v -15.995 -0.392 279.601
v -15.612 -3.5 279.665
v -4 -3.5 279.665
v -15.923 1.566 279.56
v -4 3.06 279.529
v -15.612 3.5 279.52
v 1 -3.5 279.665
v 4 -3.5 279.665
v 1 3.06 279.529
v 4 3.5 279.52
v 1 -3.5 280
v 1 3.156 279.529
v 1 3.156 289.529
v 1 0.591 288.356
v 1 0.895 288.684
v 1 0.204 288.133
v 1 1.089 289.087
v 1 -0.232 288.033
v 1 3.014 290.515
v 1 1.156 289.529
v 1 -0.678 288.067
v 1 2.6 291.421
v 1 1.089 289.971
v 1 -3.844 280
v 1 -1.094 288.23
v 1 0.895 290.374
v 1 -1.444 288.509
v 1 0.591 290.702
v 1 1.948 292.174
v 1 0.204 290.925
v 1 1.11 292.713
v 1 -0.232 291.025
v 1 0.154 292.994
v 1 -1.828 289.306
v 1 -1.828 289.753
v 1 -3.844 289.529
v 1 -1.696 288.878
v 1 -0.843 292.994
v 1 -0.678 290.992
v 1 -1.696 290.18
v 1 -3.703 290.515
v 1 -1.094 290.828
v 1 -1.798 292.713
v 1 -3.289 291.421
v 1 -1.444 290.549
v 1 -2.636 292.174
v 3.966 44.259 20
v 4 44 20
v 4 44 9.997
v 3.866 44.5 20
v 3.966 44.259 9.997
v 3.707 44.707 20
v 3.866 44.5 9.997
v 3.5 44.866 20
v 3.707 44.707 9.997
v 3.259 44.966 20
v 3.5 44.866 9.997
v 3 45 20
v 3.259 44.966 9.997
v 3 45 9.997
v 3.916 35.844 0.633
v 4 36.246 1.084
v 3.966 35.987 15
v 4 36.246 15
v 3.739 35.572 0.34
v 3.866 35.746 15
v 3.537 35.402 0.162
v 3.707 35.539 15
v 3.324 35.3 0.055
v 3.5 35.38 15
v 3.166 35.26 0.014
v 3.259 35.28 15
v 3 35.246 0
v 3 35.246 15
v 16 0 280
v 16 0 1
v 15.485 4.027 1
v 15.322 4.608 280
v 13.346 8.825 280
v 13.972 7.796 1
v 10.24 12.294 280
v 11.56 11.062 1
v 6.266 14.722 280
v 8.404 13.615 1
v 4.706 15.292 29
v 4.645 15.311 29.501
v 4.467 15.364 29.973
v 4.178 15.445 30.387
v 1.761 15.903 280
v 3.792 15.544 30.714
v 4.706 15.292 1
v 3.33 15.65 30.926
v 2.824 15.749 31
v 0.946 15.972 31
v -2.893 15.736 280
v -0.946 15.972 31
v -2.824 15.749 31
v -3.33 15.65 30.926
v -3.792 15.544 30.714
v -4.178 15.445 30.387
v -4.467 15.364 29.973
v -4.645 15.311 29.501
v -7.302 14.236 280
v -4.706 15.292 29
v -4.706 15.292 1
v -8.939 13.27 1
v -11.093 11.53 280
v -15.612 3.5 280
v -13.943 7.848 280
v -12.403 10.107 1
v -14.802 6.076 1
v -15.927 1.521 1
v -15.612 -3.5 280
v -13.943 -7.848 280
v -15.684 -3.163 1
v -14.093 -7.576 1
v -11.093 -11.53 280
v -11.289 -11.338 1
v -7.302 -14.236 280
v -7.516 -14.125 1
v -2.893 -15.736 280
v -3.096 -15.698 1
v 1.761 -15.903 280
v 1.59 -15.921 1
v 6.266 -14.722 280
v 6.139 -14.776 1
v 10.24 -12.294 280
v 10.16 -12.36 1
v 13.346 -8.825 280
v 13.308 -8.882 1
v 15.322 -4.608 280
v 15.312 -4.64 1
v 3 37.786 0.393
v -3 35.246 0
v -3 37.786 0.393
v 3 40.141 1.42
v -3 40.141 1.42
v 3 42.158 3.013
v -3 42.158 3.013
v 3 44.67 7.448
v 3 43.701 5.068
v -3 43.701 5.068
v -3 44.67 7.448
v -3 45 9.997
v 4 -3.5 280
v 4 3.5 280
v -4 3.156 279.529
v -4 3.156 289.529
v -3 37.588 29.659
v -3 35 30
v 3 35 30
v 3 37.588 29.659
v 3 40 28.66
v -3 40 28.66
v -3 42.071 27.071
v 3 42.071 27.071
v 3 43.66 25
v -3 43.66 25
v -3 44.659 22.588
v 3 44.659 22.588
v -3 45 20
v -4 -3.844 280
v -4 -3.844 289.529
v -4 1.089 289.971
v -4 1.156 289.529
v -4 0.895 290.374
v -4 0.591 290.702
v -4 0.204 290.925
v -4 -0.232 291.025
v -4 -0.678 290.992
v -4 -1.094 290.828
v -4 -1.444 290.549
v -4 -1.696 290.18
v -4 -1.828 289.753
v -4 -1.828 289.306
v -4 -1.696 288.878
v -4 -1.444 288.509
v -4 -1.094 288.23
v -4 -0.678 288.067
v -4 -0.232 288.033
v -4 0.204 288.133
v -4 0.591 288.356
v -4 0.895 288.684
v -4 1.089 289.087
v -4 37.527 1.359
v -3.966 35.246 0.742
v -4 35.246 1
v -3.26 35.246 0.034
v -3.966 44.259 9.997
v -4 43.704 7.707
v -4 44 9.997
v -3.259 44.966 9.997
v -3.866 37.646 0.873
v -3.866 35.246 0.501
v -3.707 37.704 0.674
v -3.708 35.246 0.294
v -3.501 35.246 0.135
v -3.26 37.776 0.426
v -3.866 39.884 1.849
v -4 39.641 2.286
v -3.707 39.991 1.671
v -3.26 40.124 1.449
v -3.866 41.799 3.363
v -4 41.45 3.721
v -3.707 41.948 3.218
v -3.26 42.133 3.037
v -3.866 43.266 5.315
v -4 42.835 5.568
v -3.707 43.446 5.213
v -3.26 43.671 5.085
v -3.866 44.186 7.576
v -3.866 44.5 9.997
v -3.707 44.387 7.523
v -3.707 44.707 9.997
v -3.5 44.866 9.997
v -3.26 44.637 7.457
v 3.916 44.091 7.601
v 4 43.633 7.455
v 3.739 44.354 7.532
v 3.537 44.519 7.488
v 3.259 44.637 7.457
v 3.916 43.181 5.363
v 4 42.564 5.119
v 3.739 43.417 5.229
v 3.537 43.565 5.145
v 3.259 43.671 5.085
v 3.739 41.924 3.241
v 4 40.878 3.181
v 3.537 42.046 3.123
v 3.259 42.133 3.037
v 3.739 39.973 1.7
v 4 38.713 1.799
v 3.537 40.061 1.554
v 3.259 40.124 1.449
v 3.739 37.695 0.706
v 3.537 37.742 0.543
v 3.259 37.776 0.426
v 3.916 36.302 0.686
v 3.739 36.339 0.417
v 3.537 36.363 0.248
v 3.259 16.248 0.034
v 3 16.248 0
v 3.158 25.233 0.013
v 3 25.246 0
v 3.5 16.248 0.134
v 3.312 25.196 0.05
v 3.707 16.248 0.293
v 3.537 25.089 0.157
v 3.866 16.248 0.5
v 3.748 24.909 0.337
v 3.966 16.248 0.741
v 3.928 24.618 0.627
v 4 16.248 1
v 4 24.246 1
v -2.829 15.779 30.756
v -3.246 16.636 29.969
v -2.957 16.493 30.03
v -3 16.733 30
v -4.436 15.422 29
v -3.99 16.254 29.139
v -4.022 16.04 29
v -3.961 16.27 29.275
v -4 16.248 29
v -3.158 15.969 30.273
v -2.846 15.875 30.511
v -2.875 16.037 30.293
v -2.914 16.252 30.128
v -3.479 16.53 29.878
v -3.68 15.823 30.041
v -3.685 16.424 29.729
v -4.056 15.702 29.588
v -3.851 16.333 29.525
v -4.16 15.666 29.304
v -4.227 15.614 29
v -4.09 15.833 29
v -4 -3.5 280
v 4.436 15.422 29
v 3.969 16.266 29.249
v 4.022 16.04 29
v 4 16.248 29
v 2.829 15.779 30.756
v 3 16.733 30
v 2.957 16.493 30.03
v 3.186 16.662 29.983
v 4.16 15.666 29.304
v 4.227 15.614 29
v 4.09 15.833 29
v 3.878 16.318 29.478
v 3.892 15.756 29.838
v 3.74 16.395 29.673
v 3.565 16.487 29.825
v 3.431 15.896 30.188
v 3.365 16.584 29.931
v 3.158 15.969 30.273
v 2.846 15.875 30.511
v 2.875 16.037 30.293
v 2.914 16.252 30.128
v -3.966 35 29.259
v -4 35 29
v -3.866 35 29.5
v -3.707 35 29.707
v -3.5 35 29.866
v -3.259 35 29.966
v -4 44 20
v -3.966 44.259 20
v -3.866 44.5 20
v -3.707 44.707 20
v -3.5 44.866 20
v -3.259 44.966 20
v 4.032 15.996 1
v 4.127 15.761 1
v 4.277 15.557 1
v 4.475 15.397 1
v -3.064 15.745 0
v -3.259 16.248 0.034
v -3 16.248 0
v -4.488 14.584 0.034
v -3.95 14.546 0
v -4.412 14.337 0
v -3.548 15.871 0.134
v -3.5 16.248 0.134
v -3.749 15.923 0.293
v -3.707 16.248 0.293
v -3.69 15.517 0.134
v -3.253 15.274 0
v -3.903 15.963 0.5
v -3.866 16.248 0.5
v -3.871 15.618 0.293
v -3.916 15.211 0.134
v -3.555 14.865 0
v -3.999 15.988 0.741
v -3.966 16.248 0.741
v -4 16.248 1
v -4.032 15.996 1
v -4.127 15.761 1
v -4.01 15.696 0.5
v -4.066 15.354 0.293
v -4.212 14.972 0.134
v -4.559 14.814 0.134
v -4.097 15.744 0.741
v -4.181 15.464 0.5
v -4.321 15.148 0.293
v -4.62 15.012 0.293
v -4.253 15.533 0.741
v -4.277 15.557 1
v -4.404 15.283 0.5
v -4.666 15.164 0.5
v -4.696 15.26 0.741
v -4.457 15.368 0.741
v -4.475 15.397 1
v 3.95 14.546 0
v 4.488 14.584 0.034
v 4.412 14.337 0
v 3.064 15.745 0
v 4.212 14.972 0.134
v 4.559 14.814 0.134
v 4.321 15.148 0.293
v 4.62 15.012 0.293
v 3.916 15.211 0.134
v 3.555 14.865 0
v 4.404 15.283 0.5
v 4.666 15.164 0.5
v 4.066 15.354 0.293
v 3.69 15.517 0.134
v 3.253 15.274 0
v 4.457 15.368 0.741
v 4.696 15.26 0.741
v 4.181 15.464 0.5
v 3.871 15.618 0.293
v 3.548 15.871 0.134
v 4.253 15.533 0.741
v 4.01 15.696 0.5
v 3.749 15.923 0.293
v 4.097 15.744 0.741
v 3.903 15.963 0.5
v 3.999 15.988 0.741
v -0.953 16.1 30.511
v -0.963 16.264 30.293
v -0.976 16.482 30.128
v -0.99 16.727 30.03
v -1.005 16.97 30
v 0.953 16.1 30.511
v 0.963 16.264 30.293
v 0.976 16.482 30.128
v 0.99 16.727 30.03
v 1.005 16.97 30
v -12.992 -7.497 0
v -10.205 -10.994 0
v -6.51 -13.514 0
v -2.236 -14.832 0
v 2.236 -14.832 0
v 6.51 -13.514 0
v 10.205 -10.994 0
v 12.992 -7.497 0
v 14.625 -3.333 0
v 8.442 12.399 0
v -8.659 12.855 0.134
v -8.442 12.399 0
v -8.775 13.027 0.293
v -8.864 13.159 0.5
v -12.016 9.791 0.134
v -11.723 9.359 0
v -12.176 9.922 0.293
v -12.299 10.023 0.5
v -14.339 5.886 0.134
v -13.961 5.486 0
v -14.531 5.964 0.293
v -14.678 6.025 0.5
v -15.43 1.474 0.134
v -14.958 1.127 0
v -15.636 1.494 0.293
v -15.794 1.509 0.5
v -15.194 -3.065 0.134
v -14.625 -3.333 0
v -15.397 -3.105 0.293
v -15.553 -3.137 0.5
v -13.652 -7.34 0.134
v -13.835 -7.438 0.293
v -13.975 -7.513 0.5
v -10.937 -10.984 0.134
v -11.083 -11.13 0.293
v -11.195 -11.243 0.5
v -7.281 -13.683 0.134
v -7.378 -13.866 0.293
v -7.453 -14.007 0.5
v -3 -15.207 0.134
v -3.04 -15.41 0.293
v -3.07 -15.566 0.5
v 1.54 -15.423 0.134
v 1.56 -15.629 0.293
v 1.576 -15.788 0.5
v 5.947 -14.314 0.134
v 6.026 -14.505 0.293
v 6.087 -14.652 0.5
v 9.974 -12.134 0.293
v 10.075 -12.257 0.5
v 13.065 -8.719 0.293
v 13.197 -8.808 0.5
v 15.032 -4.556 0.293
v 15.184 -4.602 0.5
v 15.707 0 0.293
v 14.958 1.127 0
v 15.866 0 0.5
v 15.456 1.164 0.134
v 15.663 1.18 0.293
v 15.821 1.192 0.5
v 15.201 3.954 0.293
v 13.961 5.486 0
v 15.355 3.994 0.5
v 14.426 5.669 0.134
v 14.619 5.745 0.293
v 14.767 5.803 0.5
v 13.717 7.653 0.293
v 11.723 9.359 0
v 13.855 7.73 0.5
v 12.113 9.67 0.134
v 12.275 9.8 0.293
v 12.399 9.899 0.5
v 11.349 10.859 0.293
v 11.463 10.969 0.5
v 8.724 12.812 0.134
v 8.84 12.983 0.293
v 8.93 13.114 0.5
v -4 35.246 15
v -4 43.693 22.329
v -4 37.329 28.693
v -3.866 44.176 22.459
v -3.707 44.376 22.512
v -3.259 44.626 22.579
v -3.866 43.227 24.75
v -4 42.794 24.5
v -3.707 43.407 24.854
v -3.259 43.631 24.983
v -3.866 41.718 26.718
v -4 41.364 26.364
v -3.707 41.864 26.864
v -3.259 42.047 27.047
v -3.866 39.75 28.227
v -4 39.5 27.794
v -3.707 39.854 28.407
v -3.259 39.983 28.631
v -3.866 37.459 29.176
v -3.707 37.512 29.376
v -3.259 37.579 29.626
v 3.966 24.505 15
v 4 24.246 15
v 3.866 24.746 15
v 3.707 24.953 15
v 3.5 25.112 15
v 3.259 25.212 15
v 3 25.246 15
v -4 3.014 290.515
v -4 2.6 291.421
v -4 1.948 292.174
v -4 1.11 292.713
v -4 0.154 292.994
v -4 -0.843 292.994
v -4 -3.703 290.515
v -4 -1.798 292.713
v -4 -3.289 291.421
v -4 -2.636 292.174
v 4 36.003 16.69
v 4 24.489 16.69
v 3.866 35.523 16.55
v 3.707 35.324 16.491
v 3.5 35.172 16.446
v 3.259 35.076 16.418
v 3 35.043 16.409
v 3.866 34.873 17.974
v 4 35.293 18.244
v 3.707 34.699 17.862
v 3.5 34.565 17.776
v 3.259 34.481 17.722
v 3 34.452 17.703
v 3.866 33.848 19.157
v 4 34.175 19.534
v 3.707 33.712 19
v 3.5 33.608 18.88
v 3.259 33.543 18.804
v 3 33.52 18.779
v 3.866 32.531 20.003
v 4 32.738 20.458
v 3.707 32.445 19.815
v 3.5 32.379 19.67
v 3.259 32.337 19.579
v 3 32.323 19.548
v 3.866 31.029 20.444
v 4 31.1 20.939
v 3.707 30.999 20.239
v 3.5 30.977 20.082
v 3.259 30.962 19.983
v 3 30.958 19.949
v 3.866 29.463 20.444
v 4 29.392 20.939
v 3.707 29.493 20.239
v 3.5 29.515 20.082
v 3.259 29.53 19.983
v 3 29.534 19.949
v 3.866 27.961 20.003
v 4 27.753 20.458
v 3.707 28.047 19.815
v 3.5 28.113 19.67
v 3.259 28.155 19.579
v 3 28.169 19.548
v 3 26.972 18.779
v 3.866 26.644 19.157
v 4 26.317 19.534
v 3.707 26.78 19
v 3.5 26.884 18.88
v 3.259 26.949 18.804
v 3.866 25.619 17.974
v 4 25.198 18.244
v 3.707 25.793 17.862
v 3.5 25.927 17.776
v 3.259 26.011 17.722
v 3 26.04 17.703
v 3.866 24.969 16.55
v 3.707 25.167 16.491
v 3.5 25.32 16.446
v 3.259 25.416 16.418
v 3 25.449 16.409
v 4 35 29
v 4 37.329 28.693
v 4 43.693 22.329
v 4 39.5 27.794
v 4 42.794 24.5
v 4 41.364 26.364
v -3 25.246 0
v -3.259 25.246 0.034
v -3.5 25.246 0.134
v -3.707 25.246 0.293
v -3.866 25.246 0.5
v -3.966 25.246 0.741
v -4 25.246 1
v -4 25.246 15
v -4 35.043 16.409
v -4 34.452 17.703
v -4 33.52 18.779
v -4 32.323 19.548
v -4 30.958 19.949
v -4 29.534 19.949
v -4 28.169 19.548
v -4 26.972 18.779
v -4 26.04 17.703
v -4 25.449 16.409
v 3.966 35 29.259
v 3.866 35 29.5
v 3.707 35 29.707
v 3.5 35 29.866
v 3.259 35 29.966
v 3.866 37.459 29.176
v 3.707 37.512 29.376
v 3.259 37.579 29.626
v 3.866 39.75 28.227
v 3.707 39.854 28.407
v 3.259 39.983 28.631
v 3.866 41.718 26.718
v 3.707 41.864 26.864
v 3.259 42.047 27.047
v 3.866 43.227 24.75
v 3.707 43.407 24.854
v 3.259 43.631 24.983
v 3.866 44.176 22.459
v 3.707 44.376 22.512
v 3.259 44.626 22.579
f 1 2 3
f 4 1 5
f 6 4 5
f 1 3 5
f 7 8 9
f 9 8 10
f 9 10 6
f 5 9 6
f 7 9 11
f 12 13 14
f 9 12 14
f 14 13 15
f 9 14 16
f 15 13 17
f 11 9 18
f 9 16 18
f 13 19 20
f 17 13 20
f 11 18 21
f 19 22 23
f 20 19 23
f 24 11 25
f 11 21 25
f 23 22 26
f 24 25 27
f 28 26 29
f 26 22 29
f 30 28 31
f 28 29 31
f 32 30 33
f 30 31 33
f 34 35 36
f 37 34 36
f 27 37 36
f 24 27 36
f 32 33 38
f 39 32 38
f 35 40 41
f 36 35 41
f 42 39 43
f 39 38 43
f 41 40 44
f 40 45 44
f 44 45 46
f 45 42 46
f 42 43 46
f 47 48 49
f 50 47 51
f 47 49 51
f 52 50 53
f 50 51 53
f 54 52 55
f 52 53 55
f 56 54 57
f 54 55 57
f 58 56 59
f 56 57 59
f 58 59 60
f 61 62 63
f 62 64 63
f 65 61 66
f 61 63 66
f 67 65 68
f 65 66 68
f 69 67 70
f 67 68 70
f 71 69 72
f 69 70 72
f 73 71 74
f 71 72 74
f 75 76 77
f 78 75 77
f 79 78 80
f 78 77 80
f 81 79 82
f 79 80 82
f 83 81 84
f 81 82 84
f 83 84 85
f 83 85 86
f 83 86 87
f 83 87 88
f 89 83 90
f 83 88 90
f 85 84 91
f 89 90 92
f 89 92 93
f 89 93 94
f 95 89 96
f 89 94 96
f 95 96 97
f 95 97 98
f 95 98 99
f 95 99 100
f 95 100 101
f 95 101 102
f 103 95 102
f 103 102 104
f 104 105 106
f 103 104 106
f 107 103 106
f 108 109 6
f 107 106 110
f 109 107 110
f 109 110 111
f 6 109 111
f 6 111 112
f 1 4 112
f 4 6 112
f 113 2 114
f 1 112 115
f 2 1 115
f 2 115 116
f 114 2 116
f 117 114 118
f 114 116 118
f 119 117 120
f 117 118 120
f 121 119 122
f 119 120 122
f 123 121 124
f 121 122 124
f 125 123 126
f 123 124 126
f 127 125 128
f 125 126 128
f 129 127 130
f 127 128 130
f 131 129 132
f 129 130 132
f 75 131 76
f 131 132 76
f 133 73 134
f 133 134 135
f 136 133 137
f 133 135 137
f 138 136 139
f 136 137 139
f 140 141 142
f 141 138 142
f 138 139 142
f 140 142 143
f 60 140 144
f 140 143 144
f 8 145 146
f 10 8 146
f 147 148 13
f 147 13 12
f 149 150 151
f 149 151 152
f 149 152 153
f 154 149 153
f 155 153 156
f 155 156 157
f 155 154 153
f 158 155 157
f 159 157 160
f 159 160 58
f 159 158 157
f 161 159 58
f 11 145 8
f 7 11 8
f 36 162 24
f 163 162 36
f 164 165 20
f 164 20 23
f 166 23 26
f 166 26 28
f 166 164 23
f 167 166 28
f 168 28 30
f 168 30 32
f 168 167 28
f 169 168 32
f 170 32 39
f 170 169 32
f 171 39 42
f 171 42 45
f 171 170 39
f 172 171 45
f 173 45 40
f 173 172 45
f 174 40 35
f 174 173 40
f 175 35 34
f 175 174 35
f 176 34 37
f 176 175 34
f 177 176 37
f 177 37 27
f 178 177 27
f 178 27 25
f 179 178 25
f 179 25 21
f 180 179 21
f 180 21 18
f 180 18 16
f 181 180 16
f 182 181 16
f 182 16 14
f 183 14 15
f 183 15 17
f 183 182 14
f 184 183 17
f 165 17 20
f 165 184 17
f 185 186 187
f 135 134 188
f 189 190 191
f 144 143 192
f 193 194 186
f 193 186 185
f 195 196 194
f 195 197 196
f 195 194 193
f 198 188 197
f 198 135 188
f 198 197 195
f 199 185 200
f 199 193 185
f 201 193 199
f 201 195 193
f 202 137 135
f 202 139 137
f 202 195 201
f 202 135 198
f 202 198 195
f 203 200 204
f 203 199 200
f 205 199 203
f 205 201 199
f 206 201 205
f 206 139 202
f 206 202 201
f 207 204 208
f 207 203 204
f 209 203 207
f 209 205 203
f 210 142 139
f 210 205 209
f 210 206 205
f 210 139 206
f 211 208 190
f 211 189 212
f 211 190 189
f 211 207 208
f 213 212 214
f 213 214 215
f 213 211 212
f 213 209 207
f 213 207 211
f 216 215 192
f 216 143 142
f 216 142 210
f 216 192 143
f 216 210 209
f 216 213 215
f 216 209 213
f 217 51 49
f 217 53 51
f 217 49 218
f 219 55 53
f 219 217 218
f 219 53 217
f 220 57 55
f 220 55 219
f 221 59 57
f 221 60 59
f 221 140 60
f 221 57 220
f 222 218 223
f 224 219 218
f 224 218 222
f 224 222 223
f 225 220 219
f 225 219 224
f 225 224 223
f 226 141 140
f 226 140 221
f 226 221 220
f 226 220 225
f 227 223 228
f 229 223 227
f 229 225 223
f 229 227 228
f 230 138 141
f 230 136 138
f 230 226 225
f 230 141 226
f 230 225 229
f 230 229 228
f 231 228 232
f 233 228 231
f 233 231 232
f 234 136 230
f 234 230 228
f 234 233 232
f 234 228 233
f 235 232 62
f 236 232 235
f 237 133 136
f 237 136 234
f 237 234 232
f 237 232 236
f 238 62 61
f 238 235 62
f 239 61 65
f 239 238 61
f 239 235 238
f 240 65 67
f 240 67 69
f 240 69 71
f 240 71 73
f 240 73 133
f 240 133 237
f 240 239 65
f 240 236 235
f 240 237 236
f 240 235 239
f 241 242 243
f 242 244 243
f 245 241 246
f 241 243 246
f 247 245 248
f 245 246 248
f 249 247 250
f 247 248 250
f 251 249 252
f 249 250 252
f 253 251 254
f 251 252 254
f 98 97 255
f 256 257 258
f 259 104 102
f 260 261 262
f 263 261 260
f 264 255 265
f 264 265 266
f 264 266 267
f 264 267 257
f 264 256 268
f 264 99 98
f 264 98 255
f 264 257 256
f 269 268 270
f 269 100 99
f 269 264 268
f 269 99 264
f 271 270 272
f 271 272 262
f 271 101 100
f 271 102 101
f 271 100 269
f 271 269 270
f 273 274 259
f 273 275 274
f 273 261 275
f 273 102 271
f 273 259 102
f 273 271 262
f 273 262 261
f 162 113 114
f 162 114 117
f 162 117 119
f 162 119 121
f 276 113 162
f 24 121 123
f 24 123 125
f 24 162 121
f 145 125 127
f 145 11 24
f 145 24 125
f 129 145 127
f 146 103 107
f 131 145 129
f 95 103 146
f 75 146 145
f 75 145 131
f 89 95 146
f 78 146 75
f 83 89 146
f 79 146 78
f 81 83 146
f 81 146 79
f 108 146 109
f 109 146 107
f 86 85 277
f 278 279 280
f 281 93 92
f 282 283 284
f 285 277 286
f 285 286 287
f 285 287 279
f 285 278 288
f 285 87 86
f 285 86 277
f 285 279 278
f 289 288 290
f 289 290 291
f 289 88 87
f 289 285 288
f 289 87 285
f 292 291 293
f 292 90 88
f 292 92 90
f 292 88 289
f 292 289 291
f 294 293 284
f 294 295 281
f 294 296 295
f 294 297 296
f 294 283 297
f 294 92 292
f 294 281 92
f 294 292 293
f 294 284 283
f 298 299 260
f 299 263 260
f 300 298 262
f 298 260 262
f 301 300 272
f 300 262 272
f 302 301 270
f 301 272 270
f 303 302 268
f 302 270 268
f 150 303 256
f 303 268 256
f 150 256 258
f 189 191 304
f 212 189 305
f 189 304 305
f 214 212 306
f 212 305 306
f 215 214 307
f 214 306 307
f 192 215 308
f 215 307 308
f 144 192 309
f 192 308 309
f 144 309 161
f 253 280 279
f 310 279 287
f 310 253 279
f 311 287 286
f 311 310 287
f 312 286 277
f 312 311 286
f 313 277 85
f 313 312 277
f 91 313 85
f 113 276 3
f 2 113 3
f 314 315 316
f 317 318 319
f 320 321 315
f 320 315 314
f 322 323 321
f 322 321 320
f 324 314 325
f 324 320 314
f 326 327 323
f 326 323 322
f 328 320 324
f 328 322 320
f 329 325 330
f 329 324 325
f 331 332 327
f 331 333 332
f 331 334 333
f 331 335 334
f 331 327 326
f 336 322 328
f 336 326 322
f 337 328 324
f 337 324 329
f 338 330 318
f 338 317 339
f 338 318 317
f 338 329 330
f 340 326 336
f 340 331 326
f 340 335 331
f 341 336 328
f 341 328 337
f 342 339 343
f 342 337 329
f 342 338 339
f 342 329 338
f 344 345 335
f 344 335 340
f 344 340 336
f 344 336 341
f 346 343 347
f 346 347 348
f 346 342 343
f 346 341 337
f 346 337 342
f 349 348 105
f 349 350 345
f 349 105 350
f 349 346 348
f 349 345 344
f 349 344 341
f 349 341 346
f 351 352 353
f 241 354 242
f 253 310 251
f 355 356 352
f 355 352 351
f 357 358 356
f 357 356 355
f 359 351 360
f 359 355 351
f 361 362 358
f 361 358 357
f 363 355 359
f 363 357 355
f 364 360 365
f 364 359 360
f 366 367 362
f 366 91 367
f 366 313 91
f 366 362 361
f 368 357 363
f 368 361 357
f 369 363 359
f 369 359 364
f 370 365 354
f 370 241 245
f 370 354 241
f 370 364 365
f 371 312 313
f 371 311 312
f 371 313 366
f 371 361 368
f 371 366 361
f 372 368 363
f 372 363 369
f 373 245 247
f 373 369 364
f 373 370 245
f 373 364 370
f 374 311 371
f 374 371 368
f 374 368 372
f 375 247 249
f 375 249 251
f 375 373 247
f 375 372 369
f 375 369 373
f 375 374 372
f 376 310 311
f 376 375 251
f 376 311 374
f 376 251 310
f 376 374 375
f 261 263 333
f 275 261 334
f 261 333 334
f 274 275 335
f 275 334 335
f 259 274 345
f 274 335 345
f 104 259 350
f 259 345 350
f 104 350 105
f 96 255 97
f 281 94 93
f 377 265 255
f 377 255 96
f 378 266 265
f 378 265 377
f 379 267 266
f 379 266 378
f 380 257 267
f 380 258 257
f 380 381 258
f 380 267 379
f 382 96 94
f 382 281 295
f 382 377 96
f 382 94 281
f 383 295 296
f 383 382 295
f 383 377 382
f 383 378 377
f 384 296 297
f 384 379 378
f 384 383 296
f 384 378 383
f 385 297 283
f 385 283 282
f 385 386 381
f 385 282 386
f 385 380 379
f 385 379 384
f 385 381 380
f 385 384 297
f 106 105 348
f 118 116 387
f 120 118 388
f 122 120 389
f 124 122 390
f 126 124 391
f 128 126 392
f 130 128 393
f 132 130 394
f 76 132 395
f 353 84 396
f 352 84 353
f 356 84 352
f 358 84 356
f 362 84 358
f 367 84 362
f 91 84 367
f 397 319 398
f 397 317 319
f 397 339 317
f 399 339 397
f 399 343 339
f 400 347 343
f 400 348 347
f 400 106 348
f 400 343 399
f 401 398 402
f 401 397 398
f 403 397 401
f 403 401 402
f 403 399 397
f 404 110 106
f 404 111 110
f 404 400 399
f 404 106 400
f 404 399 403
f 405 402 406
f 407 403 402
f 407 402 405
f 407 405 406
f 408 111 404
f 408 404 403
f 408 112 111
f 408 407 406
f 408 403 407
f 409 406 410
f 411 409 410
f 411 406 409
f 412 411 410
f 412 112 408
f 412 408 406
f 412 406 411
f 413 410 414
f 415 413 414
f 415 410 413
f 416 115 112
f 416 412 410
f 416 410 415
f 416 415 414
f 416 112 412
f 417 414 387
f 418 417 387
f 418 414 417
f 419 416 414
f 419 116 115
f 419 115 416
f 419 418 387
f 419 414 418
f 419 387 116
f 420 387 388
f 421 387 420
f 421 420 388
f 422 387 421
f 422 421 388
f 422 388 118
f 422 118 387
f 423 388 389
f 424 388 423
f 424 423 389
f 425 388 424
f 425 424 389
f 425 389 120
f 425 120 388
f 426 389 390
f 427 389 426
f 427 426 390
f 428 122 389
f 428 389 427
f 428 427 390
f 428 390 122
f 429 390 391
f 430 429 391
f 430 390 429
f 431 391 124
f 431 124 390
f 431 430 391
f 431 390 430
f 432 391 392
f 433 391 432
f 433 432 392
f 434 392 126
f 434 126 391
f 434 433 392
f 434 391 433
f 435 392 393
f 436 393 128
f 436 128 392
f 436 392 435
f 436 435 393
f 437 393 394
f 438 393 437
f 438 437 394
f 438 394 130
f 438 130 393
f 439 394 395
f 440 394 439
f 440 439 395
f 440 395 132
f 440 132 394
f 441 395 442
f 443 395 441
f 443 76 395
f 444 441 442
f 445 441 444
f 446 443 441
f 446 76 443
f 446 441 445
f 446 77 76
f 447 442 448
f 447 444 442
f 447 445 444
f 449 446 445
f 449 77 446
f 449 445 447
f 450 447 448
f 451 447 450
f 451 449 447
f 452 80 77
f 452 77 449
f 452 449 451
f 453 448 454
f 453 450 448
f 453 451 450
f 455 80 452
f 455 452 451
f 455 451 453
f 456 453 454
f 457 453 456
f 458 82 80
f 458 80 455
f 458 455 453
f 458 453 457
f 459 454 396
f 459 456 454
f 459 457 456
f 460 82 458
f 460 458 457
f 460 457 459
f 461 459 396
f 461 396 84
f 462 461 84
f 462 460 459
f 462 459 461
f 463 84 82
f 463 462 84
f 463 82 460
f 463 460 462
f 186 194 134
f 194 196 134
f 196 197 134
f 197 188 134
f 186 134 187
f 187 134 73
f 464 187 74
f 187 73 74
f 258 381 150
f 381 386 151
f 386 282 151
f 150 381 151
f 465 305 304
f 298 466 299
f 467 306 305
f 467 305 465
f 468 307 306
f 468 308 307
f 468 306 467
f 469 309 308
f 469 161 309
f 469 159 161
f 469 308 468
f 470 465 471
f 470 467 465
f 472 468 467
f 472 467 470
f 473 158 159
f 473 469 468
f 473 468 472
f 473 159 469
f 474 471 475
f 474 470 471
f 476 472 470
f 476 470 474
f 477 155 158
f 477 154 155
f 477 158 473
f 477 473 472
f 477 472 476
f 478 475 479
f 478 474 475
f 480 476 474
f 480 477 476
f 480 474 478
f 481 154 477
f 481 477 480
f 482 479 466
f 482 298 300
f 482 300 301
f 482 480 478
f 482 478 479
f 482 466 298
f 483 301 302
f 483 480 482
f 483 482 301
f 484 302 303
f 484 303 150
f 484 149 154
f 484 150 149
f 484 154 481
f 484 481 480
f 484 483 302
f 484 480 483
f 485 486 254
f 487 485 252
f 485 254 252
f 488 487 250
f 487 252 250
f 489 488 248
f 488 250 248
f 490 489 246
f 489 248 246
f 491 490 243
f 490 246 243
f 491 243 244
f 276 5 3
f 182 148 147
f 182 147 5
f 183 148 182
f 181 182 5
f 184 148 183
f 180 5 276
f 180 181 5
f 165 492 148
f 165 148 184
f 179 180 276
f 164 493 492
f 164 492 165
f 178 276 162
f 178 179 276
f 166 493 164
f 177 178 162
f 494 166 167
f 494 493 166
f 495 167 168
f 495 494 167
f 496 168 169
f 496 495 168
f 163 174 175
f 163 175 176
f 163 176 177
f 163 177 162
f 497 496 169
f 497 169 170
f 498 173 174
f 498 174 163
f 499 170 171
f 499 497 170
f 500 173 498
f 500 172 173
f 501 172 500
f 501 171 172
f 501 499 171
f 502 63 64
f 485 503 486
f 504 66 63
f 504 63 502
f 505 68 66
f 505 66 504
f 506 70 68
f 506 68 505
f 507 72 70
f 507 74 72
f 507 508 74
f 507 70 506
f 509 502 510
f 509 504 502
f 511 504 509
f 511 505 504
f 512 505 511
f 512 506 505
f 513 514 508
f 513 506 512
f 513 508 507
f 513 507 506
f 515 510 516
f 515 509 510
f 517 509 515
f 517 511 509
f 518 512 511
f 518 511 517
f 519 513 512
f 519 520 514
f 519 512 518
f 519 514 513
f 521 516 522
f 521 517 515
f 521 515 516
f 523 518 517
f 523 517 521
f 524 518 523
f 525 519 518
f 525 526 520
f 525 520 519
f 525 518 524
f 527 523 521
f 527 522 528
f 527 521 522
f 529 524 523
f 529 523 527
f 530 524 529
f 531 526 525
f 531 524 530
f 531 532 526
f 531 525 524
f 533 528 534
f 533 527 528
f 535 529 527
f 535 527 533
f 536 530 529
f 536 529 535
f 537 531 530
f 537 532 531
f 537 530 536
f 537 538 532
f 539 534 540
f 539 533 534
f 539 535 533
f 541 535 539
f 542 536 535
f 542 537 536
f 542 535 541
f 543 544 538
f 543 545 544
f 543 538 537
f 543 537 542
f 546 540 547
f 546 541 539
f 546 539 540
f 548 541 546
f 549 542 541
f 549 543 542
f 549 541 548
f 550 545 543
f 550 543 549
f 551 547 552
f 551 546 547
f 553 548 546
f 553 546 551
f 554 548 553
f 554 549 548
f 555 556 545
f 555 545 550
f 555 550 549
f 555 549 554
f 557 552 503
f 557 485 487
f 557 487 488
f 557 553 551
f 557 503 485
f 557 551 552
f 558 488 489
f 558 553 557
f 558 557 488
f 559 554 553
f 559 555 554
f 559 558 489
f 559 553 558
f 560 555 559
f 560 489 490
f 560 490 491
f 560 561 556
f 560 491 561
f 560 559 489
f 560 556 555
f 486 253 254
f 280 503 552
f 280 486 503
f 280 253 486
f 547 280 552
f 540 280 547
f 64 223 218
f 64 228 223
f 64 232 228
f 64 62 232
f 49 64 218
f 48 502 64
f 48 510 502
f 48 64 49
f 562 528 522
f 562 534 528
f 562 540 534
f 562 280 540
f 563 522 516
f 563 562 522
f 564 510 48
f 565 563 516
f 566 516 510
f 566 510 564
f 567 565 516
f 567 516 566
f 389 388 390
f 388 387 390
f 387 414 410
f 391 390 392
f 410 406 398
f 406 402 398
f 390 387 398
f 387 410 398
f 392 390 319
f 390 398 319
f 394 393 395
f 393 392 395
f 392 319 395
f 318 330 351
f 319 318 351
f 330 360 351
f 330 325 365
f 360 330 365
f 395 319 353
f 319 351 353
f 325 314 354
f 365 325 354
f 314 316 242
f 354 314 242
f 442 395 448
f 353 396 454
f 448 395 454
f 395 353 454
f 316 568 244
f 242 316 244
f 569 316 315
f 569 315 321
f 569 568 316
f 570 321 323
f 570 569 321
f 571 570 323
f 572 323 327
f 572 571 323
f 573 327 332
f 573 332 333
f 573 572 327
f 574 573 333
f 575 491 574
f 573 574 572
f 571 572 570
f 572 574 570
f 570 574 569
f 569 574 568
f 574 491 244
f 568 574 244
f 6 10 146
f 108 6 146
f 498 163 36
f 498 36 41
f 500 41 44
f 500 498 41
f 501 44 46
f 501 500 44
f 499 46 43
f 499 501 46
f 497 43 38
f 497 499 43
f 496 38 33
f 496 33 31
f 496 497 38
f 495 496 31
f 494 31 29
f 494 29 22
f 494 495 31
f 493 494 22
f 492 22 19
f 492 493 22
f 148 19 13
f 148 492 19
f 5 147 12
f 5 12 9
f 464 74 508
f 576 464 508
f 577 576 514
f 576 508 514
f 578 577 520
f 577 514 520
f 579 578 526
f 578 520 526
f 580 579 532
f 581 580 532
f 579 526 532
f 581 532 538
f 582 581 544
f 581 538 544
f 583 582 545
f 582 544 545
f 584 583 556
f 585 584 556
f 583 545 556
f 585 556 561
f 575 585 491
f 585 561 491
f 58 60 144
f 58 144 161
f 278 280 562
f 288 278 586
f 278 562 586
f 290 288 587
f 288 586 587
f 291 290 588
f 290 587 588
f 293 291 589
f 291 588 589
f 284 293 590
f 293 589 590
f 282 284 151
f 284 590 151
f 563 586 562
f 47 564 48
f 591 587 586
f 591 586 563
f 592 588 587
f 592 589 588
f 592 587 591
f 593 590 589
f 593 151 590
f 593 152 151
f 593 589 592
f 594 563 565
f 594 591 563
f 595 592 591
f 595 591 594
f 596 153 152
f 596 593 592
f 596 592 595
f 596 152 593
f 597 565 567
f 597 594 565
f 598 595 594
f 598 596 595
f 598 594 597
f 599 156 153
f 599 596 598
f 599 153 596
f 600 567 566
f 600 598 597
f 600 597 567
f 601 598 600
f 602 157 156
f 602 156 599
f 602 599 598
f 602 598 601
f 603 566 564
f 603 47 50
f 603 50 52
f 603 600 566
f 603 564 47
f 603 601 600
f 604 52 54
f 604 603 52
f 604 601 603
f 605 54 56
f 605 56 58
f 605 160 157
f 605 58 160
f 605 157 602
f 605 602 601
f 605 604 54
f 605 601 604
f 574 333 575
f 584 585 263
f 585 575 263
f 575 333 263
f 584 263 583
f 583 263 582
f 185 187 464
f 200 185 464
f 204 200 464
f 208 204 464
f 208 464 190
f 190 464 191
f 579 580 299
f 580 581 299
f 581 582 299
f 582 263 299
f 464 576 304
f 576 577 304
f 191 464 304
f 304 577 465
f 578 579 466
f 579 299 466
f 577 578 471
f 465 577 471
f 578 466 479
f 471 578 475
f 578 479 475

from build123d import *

# Parameters (mm, degrees)
F0_R        = 16
F1_DEPTH    = 280
F2_W        = 45
F2_H        = 30
F3_DEPTH    = 4
F4_R        = 1.5
F5_DEPTH    = 25
F6_T1_DEPTH = 58
F6_T3_DEPTH = 57.9848728082
F7_R        = 1
F9_DEPTH    = 5


# Not quite as in the source:
# - a fillet or chamfer that OpenCascade refuses, or shapes differently, is made with other operations: its cross-section is extruded or revolved along the edge and cut away or added


with BuildPart() as f1:
    # F0 (on Top) → F1 (new body)
    with BuildSketch(Plane.XY):
        Circle(F0_R)
    extrude(amount=F1_DEPTH)

    # F2 (on Right) → F3 (join, symmetric)
    with BuildSketch(Plane.YZ):
        with Locations((22.5, 15)):
            Rectangle(F2_W, F2_H)
    extrude(amount=F3_DEPTH, both=True)

    # F4 (on face) → F5 (cut)
    with BuildSketch(Plane.YZ.offset(4)):
        with BuildLine():
            ThreePointArc((25.2459666924, 15), (30.2459666924, 10), (35.2459666924, 15))
            ThreePointArc((35.2459666924, 15), (30.2459666924, 20), (25.2459666924, 15))
        make_face()
        with BuildLine():
            ThreePointArc((-3.5, 286.5642011166), (0, 283.0642011166), (3.5, 286.5642011166))
            ThreePointArc((3.5, 286.5642011166), (0, 290.0642011166), (-3.5, 286.5642011166))
        make_face()
        with Locations((0, 286.5642011166)):
            Circle(F4_R, mode=Mode.SUBTRACT)
        with BuildLine():
            Line((3.5, 279.5200645924), (3.5, 286.5642011166))
            ThreePointArc((3.5, 286.5642011166), (0, 283.0642011166), (-3.5, 286.5642011166))
            Line((-3.5, 286.5642011166), (-3.5, 279.665210771))
            Line((-3.5, 279.665210771), (3.5, 279.5200645924))
        make_face()
        with BuildLine():
            Line((35.2459666924, 0), (35.2459666924, 15))
            ThreePointArc((35.2459666924, 15), (30.2459666924, 10), (25.2459666924, 15))
            Line((25.2459666924, 15), (25.2459666924, 0))
            Line((25.2459666924, 0), (35.2459666924, 0))
        make_face()
    extrude(amount=-F5_DEPTH, mode=Mode.SUBTRACT)

    # F6: fillet of radius 10 on 2 edges, made by hand

    # F6_s2 → F6_t1 (cut)
    with BuildSketch(Plane.YZ.offset(-29)):
        with BuildLine():
            ThreePointArc((35, 30), (42.0710678119, 27.0710678119), (45, 20))
            Line((45, 20), (45, 30))
            Line((45, 30), (35, 30))
        make_face()
    extrude(amount=F6_T1_DEPTH, mode=Mode.SUBTRACT)

    # F6_s4 → F6_t3 (cut)
    with BuildSketch(Plane.YZ.offset(-28.9924364041)):
        with BuildLine():
            ThreePointArc((35.2459666924, 0), (42.1575019009, 3.0134105333), (45, 9.9969745616))
            Line((45, 9.9969745616), (45, 0))
            Line((45, 0), (35.2459666924, 0))
        make_face()
    extrude(amount=F6_T3_DEPTH, mode=Mode.SUBTRACT)

    # F7
    f7_edges = [f1.edges().sort_by_distance(p)[0] for p in [
        (4, 42.071068, 27.071068),
        (-4, 45, 14.998487),
        (4, 35.245967, 7.5),
        (4, 30.245967, 20),
        (4, 25.245967, 7.5),
        (4, 20.36895, 0),
        (4, 15.491933, 15),
        (4, 25.245967, 30),
        (4, 45, 14.998487),
        (4, 42.157502, 3.013411),
        (12.649111, 9.797959, 0),
        (0, 16, 30),
        (-4, 15.491933, 15),
        (-9.797959, -12.649111, 0),
        (-4, 20.36895, 0),
        (-4, 25.245967, 30),
        (-4, 42.071068, 27.071068),
        (-4, 42.157502, 3.013411),
    ]]
    fillet(f7_edges, radius=F7_R)

    # F8 (on face) → F9 (join)
    with BuildSketch(Plane(origin=(-4, 0, 0), x_dir=(0, -1, 0), z_dir=(-1, 0, 0))):
        with BuildLine():
            Line((-3.1555609312, 289.529184103), (-3.1555609312, 279.529184103))
            Line((-3.1555609312, 279.529184103), (3.8444390688, 279.529184103))
            Line((3.8444390688, 279.529184103), (3.8444390688, 289.529184103))
            ThreePointArc((3.8444390688, 289.529184103), (0.3444390688, 286.029184103), (-3.1555609312, 289.529184103))
        make_face()
        with BuildLine():
            ThreePointArc((3.8444390688, 289.529184103), (0.3444390688, 293.029184103), (-3.1555609312, 289.529184103))
            Line((-3.1555609312, 289.529184103), (-1.1555609312, 289.529184103))
            ThreePointArc((-1.1555609312, 289.529184103), (0.3444390688, 291.029184103), (1.8444390688, 289.529184103))
            Line((1.8444390688, 289.529184103), (3.8444390688, 289.529184103))
        make_face()
        with BuildLine():
            Line((-1.1555609312, 289.529184103), (-3.1555609312, 289.529184103))
            ThreePointArc((-3.1555609312, 289.529184103), (0.3444390688, 286.029184103), (3.8444390688, 289.529184103))
            Line((3.8444390688, 289.529184103), (1.8444390688, 289.529184103))
            ThreePointArc((1.8444390688, 289.529184103), (0.3444390688, 288.029184103), (-1.1555609312, 289.529184103))
        make_face()
    extrude(amount=-F9_DEPTH)


solid = f1.part
